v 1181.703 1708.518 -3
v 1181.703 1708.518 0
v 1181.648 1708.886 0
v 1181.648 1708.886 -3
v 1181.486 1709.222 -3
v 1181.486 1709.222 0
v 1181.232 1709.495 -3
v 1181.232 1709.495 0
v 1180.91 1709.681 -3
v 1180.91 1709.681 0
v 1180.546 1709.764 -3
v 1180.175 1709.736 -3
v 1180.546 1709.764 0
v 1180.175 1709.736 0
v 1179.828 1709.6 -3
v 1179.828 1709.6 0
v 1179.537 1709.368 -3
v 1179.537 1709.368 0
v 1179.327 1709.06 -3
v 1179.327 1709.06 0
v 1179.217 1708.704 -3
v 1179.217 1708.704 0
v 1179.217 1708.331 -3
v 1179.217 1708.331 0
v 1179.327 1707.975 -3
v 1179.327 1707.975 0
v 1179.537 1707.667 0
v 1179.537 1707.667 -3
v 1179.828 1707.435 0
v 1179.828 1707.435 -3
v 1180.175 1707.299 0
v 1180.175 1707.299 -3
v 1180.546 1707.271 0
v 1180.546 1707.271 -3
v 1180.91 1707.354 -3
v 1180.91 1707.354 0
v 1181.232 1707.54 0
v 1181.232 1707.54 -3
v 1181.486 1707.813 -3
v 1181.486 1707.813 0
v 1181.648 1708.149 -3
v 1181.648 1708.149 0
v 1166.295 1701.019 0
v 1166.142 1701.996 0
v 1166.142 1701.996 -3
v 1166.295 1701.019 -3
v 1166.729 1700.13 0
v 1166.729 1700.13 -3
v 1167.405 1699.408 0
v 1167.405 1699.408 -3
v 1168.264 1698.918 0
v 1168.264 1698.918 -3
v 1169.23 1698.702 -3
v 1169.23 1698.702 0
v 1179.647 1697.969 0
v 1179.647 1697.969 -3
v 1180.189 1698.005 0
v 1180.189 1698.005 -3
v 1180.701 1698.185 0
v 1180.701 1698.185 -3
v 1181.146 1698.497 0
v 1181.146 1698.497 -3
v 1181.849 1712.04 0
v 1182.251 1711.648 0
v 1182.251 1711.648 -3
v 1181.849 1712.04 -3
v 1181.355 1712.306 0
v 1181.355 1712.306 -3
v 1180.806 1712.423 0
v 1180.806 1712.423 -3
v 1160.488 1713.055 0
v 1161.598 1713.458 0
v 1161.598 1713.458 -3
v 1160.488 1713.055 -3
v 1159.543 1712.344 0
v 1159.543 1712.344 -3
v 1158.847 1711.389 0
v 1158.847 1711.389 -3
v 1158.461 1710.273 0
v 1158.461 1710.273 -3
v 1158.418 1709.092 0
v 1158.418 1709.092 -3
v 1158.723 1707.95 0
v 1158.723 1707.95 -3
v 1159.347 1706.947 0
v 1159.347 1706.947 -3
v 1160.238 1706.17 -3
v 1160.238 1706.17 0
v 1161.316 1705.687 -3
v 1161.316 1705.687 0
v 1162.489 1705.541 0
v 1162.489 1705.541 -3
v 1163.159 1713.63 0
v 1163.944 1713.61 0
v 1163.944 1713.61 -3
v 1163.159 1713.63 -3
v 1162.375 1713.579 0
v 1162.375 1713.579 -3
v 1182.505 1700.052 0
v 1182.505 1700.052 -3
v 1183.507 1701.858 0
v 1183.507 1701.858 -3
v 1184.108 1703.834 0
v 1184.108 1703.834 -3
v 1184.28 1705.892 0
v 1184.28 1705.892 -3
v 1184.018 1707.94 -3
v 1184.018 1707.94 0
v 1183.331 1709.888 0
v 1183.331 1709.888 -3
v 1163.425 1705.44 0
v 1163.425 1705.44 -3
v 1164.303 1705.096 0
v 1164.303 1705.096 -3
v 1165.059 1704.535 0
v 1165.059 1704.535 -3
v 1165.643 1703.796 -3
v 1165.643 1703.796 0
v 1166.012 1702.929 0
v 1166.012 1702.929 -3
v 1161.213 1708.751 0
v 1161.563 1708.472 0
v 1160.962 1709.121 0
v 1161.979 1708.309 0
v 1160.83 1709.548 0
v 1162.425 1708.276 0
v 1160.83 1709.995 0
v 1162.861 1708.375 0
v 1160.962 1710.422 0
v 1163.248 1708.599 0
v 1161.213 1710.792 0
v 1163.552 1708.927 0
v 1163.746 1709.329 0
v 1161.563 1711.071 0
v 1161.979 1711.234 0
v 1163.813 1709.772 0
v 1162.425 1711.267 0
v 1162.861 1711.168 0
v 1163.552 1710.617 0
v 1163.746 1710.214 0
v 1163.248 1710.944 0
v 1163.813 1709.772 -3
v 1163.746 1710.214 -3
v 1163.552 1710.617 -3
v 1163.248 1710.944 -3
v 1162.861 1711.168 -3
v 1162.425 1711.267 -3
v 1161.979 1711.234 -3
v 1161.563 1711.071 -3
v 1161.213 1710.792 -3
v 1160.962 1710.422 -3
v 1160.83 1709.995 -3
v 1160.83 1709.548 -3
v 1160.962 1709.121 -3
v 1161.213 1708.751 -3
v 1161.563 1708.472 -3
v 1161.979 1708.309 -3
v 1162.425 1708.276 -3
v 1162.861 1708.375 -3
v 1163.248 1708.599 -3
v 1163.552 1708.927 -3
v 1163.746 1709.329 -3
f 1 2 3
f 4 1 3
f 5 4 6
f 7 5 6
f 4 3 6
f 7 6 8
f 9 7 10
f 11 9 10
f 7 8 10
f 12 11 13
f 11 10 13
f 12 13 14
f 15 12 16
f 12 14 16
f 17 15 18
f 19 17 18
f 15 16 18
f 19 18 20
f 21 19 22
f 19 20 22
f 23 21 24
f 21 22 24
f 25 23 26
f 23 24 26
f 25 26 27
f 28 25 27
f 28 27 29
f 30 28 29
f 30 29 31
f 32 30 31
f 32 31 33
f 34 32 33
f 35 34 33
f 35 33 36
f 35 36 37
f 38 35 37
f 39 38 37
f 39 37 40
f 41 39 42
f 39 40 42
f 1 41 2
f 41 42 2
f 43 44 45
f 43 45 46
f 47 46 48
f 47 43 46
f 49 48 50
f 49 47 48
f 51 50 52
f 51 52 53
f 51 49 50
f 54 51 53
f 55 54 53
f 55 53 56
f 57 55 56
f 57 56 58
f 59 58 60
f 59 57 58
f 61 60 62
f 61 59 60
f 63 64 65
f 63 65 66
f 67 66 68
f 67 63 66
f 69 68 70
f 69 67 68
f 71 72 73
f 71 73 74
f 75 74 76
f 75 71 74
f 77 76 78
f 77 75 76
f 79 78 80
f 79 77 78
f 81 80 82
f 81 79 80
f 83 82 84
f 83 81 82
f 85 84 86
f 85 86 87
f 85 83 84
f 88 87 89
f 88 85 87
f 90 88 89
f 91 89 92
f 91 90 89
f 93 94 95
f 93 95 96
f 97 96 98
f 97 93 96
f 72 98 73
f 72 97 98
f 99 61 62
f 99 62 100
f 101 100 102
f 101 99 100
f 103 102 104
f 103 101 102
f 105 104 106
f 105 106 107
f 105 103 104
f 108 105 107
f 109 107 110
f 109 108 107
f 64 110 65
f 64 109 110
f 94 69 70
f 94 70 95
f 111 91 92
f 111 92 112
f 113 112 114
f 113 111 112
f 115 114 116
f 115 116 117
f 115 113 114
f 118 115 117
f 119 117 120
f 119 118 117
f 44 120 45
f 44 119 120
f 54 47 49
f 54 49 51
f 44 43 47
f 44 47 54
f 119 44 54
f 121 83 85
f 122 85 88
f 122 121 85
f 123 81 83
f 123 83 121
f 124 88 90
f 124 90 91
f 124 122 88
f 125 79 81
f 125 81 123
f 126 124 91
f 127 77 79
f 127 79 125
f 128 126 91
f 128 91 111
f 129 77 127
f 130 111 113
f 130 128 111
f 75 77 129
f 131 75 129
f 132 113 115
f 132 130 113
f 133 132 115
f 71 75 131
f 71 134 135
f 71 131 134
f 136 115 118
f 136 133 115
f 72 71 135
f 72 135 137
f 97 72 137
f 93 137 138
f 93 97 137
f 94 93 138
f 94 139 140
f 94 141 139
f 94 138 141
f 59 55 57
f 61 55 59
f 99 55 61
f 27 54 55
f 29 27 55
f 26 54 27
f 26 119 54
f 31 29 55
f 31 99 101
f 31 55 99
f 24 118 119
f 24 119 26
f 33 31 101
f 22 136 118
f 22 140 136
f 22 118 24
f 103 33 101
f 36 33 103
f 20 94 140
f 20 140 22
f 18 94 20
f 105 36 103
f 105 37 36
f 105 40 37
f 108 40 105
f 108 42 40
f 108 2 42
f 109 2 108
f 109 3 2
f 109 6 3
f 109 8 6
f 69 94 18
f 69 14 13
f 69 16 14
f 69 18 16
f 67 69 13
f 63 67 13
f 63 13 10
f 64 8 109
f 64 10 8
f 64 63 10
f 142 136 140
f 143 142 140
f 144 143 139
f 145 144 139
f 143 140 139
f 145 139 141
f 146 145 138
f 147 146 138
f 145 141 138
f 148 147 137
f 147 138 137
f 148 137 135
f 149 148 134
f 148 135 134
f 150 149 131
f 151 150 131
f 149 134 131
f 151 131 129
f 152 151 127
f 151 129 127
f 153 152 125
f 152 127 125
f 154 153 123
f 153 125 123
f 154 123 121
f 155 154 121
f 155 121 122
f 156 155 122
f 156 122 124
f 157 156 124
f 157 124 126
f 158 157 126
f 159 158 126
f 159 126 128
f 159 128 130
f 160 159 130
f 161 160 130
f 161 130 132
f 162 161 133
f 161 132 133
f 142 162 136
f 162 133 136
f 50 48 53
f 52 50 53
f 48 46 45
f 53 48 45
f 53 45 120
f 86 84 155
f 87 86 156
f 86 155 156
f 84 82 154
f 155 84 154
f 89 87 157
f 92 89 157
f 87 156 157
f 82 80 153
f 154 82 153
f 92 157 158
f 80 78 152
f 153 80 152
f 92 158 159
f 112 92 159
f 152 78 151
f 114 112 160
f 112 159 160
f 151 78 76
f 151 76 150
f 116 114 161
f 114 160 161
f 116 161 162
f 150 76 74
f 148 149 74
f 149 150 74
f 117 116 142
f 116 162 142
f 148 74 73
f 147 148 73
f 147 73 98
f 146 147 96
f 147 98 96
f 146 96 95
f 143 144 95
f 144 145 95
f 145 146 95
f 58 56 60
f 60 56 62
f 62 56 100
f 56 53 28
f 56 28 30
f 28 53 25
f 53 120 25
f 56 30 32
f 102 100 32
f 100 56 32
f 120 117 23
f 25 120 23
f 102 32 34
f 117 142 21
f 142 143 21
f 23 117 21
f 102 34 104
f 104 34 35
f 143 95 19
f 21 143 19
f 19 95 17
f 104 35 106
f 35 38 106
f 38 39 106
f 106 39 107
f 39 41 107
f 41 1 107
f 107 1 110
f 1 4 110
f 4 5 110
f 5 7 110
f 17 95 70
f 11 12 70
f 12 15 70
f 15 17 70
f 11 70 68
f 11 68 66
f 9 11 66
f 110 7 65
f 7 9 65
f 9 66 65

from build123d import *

# Parameters (mm, degrees)
ESQUISSE1_R               = 1.5
ESQUISSE1_R_2             = 1.25
T_LE_DE_BASE_PLI_E1_DEPTH = 3


# Sheet-metal steps are written as plain solids
with BuildPart() as part:
    # Esquisse1 → Tôle de base pliée1 (new body)
    with BuildSketch(Plane.XY):
        with BuildLine():
            Line((1180.806329324, 1712.423223535), (1163.94410285, 1713.60971993))
            ThreePointArc((1163.94410285, 1713.60971993), (1162.76612345, 1713.612955968), (1161.59842695, 1713.457614973))
            ThreePointArc((1161.59842695, 1713.457614973), (1158.418396897, 1709.091687704), (1162.488835778, 1705.54127373))
            ThreePointArc((1162.488835778, 1705.54127373), (1165.059310496, 1704.535149371), (1166.141947966, 1701.995952134))
            ThreePointArc((1166.141947966, 1701.995952134), (1167.040054527, 1699.743489734), (1169.229884323, 1698.701939096))
            Line((1169.229884323, 1698.701939096), (1179.646505762, 1697.968982283))
            ThreePointArc((1179.646505762, 1697.968982283), (1180.450889379, 1698.077491546), (1181.145910596, 1698.496720327))
            ThreePointArc((1181.145910596, 1698.496720327), (1184.248383676, 1704.858228491), (1182.250729268, 1711.648184471))
            ThreePointArc((1182.250729268, 1711.648184471), (1181.611578951, 1712.190479321), (1180.806329324, 1712.423223535))
        make_face()
        with Locations((1162.31301042, 1709.771535786)):
            Circle(ESQUISSE1_R, mode=Mode.SUBTRACT)
        with Locations((1180.453067935, 1708.517601578)):
            Circle(ESQUISSE1_R_2, mode=Mode.SUBTRACT)
    extrude(amount=-T_LE_DE_BASE_PLI_E1_DEPTH)


solid = part.part
